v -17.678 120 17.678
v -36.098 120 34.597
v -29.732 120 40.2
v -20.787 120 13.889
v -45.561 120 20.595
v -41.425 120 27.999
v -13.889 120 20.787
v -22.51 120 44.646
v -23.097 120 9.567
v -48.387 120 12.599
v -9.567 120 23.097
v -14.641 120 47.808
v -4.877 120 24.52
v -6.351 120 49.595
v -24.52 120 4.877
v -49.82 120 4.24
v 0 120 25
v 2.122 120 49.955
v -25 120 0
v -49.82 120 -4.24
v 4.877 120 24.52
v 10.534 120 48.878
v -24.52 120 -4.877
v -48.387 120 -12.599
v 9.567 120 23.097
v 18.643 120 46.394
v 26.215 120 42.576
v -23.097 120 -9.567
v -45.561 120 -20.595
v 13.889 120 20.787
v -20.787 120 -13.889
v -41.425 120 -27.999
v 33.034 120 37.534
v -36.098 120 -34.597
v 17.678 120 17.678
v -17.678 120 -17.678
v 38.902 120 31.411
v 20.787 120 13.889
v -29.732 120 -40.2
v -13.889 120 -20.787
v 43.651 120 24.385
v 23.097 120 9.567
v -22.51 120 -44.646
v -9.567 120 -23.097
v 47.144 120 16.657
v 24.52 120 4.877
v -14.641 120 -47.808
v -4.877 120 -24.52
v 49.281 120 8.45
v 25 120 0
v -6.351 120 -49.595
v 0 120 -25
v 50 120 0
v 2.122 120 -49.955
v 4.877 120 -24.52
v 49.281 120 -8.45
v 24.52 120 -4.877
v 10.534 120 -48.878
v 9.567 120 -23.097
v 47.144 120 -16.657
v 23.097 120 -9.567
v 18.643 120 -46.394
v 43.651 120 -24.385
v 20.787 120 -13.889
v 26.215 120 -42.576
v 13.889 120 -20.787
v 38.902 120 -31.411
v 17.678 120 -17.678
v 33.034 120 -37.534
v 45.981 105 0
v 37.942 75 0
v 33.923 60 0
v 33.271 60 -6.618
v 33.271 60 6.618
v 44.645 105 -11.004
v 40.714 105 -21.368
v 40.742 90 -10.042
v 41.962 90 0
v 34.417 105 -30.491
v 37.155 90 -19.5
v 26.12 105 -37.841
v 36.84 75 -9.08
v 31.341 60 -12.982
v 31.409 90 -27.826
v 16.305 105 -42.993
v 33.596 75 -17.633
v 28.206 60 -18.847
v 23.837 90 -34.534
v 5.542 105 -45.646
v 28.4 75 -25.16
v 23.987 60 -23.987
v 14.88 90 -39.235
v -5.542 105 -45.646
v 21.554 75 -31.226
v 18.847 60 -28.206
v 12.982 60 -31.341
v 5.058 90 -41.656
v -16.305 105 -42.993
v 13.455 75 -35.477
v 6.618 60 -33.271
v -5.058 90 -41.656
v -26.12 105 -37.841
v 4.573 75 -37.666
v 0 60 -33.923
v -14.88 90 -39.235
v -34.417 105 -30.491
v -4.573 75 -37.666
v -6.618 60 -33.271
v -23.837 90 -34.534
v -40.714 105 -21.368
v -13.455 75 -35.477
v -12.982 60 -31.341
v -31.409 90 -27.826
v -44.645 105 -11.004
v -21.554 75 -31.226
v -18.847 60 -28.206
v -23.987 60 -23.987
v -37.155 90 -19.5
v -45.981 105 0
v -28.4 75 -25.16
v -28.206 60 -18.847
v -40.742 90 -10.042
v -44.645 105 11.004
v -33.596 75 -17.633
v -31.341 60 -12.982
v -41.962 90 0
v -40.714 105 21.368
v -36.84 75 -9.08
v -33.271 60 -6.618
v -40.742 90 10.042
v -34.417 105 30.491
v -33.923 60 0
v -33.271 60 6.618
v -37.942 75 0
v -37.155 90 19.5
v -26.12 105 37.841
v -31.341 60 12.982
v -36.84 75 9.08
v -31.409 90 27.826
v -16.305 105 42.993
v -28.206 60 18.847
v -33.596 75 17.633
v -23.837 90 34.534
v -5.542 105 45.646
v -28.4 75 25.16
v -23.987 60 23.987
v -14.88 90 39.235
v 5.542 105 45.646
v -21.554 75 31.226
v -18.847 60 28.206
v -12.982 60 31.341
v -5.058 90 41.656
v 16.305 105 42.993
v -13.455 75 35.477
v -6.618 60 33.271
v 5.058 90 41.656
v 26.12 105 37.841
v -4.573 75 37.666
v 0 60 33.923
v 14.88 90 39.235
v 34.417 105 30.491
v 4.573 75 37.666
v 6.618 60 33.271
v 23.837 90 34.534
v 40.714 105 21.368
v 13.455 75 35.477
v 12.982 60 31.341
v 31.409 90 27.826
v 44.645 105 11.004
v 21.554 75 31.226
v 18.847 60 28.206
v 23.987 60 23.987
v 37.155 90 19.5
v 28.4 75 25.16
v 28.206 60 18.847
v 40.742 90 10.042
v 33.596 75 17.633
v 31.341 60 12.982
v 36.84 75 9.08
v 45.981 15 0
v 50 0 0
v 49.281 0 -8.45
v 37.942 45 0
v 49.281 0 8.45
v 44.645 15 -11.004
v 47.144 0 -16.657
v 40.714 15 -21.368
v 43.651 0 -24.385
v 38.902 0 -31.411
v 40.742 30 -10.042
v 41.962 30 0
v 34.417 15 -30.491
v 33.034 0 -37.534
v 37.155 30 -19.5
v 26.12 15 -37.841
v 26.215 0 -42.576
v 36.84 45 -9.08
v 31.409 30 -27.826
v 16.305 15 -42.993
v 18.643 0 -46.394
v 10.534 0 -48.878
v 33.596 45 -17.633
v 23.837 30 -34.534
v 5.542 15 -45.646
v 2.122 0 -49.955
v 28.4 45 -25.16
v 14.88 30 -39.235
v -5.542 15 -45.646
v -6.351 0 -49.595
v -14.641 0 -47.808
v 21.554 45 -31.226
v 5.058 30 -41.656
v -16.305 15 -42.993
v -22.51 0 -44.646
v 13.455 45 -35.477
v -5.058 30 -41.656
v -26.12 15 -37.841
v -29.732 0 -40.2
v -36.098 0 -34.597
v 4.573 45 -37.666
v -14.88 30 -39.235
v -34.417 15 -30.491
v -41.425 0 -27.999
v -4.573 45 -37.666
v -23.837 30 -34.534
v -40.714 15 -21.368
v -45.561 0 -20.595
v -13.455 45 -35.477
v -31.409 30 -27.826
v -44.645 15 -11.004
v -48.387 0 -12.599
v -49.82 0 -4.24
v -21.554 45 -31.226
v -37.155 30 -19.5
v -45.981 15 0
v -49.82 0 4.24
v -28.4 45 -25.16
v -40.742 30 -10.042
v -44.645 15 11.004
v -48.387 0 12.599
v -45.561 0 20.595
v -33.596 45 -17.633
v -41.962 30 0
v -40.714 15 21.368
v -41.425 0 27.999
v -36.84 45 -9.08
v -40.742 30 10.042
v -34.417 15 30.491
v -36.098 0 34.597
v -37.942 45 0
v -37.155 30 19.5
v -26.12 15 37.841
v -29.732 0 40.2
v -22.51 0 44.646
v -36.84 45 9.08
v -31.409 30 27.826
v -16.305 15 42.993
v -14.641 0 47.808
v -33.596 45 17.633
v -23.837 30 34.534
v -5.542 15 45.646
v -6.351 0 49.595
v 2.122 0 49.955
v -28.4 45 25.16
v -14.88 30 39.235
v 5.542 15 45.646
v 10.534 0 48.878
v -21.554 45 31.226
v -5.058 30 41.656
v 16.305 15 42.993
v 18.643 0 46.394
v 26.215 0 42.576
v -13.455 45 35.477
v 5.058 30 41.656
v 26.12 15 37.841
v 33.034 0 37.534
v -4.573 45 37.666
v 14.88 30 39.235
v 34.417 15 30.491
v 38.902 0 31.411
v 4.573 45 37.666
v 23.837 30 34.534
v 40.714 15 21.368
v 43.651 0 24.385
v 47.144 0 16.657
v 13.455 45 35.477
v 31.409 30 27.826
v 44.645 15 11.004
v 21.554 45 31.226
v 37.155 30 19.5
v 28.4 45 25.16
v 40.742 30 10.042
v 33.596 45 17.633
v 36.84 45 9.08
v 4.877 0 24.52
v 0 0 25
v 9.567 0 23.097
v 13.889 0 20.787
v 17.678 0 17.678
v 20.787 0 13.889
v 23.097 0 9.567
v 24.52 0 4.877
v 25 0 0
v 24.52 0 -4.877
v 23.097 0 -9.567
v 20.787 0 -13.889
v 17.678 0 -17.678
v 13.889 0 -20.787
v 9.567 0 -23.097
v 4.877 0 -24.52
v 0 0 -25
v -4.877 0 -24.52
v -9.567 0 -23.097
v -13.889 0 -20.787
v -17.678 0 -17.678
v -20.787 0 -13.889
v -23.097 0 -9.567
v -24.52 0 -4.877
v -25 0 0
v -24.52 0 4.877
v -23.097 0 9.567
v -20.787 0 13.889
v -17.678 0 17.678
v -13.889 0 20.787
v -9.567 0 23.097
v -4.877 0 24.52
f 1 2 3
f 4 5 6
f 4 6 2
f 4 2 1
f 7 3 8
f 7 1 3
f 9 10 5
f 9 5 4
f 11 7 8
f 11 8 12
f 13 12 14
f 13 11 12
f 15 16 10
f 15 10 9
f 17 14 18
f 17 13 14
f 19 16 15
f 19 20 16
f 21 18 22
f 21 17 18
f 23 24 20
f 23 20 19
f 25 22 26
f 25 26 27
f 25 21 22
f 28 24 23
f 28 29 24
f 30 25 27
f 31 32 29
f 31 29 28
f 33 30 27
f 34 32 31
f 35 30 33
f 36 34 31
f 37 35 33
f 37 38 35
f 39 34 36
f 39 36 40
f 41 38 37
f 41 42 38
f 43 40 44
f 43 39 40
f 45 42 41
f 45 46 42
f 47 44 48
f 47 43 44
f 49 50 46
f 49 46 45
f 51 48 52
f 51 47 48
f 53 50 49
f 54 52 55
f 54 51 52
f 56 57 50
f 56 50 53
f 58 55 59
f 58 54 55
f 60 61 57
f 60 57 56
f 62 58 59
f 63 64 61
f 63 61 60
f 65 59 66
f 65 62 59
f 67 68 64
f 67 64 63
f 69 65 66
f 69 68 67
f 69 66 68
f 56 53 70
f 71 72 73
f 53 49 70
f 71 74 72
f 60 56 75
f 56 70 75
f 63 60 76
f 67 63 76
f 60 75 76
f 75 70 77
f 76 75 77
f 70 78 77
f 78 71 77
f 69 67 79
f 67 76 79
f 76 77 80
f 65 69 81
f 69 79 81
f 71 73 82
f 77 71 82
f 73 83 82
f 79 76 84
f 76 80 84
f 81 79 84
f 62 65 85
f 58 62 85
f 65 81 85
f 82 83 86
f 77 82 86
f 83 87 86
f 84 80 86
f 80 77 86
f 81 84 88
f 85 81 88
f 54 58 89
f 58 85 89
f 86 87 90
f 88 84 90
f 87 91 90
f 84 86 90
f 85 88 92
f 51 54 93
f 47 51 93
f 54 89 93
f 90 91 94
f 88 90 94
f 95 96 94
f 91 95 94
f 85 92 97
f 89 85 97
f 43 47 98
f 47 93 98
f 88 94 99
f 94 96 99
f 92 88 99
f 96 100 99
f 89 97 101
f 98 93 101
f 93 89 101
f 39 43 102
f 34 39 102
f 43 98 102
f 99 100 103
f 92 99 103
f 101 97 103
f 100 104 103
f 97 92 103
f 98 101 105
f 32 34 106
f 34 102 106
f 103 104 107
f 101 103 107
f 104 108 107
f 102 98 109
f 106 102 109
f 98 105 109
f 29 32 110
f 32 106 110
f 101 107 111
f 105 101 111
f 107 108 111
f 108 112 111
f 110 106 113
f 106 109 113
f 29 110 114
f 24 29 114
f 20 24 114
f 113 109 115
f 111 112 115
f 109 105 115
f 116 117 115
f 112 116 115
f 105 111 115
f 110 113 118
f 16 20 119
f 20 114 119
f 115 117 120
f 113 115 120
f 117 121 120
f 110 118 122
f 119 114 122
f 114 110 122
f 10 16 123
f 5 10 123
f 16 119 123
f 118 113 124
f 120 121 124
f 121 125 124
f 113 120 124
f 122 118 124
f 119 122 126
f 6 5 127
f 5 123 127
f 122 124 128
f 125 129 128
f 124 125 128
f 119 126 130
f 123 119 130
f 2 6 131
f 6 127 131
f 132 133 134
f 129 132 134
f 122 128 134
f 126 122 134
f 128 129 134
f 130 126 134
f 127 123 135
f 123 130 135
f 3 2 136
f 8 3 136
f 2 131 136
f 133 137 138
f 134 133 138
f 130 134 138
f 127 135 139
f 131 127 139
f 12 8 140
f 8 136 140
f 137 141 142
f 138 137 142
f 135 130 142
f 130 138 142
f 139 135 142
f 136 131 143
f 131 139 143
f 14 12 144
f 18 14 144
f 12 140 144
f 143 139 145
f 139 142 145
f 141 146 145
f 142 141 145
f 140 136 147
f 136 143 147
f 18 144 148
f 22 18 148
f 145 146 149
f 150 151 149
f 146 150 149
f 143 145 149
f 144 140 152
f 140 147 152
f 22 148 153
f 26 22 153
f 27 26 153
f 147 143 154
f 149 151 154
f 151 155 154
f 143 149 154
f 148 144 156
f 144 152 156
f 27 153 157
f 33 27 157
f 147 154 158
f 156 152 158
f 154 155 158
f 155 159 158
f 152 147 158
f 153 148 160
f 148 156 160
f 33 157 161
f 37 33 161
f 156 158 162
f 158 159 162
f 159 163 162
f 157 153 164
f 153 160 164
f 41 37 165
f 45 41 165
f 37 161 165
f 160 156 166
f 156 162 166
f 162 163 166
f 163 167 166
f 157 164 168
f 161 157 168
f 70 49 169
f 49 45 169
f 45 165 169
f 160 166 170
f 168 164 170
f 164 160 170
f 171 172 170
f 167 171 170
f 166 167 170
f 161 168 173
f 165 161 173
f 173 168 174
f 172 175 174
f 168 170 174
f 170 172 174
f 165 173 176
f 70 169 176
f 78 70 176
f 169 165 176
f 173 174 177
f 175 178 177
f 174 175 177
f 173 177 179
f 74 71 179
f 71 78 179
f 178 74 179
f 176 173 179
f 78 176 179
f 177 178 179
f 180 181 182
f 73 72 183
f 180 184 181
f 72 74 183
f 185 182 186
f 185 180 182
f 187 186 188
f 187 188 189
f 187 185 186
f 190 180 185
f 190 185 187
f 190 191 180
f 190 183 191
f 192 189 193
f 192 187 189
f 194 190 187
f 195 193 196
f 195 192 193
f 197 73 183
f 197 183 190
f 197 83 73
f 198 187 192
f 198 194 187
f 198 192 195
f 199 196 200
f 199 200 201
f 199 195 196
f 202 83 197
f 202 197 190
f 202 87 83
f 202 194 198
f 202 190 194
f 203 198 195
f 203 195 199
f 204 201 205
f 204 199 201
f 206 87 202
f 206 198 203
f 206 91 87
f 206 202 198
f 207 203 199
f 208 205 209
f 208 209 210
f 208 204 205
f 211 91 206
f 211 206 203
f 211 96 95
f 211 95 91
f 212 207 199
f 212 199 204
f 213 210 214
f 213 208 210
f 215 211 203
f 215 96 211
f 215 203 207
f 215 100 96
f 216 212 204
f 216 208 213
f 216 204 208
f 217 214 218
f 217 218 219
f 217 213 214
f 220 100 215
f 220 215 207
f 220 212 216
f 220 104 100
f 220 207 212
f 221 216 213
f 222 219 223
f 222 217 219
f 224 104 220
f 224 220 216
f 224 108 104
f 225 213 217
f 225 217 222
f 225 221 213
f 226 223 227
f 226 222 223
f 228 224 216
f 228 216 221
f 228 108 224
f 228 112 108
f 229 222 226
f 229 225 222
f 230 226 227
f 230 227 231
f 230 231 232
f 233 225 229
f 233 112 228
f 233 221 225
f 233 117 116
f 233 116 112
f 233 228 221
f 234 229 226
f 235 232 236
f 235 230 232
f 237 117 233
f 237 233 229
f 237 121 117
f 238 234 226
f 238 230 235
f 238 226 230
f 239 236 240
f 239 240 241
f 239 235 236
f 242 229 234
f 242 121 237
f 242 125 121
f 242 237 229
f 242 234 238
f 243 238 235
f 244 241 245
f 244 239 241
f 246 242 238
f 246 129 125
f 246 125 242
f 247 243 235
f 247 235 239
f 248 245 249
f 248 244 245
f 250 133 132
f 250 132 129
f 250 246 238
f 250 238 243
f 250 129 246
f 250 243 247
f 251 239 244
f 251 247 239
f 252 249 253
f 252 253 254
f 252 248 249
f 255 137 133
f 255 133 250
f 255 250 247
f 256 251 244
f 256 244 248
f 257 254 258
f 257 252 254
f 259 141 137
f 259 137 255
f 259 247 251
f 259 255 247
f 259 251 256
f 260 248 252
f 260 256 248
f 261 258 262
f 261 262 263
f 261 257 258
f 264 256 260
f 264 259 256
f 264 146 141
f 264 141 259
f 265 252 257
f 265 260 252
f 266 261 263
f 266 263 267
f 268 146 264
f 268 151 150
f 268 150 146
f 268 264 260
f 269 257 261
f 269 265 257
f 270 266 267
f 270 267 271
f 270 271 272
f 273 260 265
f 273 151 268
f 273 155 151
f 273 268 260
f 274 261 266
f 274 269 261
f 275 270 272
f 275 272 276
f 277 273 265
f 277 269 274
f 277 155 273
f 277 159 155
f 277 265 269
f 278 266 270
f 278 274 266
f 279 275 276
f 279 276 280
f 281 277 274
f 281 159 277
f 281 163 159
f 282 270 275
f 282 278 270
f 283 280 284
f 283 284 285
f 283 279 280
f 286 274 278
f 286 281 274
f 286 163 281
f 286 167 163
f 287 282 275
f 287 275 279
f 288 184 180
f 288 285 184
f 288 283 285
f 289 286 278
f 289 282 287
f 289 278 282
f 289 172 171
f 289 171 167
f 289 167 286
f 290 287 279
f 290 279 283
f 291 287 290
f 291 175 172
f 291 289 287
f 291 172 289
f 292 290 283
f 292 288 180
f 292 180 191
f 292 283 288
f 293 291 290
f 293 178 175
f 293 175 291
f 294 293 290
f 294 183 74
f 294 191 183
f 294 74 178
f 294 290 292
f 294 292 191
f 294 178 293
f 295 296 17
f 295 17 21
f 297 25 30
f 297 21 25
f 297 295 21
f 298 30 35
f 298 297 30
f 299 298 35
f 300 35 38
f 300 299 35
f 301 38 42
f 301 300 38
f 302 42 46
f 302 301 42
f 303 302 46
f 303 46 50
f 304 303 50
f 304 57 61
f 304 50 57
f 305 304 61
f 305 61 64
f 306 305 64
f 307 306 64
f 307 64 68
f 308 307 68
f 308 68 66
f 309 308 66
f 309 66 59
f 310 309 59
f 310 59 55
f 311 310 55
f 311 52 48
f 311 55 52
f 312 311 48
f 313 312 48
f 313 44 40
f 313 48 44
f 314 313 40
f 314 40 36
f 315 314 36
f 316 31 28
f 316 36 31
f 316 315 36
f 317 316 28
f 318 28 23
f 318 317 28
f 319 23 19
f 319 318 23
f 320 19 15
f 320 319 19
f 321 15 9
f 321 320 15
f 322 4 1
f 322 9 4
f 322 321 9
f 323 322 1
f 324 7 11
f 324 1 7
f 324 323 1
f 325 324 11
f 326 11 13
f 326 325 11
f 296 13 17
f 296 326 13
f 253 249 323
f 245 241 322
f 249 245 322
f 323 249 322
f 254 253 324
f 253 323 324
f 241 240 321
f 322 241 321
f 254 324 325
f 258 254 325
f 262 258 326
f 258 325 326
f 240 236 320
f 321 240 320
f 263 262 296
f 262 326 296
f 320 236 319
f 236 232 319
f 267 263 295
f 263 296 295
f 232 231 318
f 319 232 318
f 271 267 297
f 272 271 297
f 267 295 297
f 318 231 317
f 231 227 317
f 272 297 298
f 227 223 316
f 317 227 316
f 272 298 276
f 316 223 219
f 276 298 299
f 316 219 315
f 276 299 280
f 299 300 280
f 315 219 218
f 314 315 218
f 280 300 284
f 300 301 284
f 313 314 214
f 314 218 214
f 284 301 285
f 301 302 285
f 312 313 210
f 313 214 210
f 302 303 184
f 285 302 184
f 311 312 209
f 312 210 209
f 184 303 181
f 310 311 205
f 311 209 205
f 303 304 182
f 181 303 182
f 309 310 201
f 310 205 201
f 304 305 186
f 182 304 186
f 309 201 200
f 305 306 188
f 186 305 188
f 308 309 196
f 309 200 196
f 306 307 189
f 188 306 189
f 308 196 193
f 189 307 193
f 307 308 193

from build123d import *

# Parameters (mm, degrees)
SKETCH1_R               = 50
BOSS_EXTRUDE1_DEPTH     = 60
BOSS_EXTRUDE1_TAPER     = 15
CUT_EXTRUDE1_DEPTH      = 140.28388293
CUT_EXTRUDE1_DEPTH_BACK = 140.28388293
SKETCH2_R               = 25


with BuildPart() as part:
    # Sketch1 → Boss-Extrude1 (new body)
    with BuildSketch(Plane(origin=(0, 0, 0), x_dir=(1, 0, 0), z_dir=(0, 1, 0))):
        Circle(SKETCH1_R)
    boss_extrude1 = extrude(amount=BOSS_EXTRUDE1_DEPTH, taper=BOSS_EXTRUDE1_TAPER)

    # Mirror2: Boss-Extrude1 across plane
    add(boss_extrude1.mirror(Plane.ZX.offset(60)))

    # Sketch2 → Cut-Extrude1 (cut, two sides: drawn at the far end of the back side and taken through both)
    with BuildSketch(Plane(origin=(0, 120, 0), x_dir=(1, 0, 0), z_dir=(0, 1, 0)).offset(-CUT_EXTRUDE1_DEPTH_BACK)):
        with Locations(Location((0, 0, 0), (0, 0, 270))):
            Circle(SKETCH2_R)
    extrude(amount=CUT_EXTRUDE1_DEPTH + CUT_EXTRUDE1_DEPTH_BACK, mode=Mode.SUBTRACT)


solid = part.part
